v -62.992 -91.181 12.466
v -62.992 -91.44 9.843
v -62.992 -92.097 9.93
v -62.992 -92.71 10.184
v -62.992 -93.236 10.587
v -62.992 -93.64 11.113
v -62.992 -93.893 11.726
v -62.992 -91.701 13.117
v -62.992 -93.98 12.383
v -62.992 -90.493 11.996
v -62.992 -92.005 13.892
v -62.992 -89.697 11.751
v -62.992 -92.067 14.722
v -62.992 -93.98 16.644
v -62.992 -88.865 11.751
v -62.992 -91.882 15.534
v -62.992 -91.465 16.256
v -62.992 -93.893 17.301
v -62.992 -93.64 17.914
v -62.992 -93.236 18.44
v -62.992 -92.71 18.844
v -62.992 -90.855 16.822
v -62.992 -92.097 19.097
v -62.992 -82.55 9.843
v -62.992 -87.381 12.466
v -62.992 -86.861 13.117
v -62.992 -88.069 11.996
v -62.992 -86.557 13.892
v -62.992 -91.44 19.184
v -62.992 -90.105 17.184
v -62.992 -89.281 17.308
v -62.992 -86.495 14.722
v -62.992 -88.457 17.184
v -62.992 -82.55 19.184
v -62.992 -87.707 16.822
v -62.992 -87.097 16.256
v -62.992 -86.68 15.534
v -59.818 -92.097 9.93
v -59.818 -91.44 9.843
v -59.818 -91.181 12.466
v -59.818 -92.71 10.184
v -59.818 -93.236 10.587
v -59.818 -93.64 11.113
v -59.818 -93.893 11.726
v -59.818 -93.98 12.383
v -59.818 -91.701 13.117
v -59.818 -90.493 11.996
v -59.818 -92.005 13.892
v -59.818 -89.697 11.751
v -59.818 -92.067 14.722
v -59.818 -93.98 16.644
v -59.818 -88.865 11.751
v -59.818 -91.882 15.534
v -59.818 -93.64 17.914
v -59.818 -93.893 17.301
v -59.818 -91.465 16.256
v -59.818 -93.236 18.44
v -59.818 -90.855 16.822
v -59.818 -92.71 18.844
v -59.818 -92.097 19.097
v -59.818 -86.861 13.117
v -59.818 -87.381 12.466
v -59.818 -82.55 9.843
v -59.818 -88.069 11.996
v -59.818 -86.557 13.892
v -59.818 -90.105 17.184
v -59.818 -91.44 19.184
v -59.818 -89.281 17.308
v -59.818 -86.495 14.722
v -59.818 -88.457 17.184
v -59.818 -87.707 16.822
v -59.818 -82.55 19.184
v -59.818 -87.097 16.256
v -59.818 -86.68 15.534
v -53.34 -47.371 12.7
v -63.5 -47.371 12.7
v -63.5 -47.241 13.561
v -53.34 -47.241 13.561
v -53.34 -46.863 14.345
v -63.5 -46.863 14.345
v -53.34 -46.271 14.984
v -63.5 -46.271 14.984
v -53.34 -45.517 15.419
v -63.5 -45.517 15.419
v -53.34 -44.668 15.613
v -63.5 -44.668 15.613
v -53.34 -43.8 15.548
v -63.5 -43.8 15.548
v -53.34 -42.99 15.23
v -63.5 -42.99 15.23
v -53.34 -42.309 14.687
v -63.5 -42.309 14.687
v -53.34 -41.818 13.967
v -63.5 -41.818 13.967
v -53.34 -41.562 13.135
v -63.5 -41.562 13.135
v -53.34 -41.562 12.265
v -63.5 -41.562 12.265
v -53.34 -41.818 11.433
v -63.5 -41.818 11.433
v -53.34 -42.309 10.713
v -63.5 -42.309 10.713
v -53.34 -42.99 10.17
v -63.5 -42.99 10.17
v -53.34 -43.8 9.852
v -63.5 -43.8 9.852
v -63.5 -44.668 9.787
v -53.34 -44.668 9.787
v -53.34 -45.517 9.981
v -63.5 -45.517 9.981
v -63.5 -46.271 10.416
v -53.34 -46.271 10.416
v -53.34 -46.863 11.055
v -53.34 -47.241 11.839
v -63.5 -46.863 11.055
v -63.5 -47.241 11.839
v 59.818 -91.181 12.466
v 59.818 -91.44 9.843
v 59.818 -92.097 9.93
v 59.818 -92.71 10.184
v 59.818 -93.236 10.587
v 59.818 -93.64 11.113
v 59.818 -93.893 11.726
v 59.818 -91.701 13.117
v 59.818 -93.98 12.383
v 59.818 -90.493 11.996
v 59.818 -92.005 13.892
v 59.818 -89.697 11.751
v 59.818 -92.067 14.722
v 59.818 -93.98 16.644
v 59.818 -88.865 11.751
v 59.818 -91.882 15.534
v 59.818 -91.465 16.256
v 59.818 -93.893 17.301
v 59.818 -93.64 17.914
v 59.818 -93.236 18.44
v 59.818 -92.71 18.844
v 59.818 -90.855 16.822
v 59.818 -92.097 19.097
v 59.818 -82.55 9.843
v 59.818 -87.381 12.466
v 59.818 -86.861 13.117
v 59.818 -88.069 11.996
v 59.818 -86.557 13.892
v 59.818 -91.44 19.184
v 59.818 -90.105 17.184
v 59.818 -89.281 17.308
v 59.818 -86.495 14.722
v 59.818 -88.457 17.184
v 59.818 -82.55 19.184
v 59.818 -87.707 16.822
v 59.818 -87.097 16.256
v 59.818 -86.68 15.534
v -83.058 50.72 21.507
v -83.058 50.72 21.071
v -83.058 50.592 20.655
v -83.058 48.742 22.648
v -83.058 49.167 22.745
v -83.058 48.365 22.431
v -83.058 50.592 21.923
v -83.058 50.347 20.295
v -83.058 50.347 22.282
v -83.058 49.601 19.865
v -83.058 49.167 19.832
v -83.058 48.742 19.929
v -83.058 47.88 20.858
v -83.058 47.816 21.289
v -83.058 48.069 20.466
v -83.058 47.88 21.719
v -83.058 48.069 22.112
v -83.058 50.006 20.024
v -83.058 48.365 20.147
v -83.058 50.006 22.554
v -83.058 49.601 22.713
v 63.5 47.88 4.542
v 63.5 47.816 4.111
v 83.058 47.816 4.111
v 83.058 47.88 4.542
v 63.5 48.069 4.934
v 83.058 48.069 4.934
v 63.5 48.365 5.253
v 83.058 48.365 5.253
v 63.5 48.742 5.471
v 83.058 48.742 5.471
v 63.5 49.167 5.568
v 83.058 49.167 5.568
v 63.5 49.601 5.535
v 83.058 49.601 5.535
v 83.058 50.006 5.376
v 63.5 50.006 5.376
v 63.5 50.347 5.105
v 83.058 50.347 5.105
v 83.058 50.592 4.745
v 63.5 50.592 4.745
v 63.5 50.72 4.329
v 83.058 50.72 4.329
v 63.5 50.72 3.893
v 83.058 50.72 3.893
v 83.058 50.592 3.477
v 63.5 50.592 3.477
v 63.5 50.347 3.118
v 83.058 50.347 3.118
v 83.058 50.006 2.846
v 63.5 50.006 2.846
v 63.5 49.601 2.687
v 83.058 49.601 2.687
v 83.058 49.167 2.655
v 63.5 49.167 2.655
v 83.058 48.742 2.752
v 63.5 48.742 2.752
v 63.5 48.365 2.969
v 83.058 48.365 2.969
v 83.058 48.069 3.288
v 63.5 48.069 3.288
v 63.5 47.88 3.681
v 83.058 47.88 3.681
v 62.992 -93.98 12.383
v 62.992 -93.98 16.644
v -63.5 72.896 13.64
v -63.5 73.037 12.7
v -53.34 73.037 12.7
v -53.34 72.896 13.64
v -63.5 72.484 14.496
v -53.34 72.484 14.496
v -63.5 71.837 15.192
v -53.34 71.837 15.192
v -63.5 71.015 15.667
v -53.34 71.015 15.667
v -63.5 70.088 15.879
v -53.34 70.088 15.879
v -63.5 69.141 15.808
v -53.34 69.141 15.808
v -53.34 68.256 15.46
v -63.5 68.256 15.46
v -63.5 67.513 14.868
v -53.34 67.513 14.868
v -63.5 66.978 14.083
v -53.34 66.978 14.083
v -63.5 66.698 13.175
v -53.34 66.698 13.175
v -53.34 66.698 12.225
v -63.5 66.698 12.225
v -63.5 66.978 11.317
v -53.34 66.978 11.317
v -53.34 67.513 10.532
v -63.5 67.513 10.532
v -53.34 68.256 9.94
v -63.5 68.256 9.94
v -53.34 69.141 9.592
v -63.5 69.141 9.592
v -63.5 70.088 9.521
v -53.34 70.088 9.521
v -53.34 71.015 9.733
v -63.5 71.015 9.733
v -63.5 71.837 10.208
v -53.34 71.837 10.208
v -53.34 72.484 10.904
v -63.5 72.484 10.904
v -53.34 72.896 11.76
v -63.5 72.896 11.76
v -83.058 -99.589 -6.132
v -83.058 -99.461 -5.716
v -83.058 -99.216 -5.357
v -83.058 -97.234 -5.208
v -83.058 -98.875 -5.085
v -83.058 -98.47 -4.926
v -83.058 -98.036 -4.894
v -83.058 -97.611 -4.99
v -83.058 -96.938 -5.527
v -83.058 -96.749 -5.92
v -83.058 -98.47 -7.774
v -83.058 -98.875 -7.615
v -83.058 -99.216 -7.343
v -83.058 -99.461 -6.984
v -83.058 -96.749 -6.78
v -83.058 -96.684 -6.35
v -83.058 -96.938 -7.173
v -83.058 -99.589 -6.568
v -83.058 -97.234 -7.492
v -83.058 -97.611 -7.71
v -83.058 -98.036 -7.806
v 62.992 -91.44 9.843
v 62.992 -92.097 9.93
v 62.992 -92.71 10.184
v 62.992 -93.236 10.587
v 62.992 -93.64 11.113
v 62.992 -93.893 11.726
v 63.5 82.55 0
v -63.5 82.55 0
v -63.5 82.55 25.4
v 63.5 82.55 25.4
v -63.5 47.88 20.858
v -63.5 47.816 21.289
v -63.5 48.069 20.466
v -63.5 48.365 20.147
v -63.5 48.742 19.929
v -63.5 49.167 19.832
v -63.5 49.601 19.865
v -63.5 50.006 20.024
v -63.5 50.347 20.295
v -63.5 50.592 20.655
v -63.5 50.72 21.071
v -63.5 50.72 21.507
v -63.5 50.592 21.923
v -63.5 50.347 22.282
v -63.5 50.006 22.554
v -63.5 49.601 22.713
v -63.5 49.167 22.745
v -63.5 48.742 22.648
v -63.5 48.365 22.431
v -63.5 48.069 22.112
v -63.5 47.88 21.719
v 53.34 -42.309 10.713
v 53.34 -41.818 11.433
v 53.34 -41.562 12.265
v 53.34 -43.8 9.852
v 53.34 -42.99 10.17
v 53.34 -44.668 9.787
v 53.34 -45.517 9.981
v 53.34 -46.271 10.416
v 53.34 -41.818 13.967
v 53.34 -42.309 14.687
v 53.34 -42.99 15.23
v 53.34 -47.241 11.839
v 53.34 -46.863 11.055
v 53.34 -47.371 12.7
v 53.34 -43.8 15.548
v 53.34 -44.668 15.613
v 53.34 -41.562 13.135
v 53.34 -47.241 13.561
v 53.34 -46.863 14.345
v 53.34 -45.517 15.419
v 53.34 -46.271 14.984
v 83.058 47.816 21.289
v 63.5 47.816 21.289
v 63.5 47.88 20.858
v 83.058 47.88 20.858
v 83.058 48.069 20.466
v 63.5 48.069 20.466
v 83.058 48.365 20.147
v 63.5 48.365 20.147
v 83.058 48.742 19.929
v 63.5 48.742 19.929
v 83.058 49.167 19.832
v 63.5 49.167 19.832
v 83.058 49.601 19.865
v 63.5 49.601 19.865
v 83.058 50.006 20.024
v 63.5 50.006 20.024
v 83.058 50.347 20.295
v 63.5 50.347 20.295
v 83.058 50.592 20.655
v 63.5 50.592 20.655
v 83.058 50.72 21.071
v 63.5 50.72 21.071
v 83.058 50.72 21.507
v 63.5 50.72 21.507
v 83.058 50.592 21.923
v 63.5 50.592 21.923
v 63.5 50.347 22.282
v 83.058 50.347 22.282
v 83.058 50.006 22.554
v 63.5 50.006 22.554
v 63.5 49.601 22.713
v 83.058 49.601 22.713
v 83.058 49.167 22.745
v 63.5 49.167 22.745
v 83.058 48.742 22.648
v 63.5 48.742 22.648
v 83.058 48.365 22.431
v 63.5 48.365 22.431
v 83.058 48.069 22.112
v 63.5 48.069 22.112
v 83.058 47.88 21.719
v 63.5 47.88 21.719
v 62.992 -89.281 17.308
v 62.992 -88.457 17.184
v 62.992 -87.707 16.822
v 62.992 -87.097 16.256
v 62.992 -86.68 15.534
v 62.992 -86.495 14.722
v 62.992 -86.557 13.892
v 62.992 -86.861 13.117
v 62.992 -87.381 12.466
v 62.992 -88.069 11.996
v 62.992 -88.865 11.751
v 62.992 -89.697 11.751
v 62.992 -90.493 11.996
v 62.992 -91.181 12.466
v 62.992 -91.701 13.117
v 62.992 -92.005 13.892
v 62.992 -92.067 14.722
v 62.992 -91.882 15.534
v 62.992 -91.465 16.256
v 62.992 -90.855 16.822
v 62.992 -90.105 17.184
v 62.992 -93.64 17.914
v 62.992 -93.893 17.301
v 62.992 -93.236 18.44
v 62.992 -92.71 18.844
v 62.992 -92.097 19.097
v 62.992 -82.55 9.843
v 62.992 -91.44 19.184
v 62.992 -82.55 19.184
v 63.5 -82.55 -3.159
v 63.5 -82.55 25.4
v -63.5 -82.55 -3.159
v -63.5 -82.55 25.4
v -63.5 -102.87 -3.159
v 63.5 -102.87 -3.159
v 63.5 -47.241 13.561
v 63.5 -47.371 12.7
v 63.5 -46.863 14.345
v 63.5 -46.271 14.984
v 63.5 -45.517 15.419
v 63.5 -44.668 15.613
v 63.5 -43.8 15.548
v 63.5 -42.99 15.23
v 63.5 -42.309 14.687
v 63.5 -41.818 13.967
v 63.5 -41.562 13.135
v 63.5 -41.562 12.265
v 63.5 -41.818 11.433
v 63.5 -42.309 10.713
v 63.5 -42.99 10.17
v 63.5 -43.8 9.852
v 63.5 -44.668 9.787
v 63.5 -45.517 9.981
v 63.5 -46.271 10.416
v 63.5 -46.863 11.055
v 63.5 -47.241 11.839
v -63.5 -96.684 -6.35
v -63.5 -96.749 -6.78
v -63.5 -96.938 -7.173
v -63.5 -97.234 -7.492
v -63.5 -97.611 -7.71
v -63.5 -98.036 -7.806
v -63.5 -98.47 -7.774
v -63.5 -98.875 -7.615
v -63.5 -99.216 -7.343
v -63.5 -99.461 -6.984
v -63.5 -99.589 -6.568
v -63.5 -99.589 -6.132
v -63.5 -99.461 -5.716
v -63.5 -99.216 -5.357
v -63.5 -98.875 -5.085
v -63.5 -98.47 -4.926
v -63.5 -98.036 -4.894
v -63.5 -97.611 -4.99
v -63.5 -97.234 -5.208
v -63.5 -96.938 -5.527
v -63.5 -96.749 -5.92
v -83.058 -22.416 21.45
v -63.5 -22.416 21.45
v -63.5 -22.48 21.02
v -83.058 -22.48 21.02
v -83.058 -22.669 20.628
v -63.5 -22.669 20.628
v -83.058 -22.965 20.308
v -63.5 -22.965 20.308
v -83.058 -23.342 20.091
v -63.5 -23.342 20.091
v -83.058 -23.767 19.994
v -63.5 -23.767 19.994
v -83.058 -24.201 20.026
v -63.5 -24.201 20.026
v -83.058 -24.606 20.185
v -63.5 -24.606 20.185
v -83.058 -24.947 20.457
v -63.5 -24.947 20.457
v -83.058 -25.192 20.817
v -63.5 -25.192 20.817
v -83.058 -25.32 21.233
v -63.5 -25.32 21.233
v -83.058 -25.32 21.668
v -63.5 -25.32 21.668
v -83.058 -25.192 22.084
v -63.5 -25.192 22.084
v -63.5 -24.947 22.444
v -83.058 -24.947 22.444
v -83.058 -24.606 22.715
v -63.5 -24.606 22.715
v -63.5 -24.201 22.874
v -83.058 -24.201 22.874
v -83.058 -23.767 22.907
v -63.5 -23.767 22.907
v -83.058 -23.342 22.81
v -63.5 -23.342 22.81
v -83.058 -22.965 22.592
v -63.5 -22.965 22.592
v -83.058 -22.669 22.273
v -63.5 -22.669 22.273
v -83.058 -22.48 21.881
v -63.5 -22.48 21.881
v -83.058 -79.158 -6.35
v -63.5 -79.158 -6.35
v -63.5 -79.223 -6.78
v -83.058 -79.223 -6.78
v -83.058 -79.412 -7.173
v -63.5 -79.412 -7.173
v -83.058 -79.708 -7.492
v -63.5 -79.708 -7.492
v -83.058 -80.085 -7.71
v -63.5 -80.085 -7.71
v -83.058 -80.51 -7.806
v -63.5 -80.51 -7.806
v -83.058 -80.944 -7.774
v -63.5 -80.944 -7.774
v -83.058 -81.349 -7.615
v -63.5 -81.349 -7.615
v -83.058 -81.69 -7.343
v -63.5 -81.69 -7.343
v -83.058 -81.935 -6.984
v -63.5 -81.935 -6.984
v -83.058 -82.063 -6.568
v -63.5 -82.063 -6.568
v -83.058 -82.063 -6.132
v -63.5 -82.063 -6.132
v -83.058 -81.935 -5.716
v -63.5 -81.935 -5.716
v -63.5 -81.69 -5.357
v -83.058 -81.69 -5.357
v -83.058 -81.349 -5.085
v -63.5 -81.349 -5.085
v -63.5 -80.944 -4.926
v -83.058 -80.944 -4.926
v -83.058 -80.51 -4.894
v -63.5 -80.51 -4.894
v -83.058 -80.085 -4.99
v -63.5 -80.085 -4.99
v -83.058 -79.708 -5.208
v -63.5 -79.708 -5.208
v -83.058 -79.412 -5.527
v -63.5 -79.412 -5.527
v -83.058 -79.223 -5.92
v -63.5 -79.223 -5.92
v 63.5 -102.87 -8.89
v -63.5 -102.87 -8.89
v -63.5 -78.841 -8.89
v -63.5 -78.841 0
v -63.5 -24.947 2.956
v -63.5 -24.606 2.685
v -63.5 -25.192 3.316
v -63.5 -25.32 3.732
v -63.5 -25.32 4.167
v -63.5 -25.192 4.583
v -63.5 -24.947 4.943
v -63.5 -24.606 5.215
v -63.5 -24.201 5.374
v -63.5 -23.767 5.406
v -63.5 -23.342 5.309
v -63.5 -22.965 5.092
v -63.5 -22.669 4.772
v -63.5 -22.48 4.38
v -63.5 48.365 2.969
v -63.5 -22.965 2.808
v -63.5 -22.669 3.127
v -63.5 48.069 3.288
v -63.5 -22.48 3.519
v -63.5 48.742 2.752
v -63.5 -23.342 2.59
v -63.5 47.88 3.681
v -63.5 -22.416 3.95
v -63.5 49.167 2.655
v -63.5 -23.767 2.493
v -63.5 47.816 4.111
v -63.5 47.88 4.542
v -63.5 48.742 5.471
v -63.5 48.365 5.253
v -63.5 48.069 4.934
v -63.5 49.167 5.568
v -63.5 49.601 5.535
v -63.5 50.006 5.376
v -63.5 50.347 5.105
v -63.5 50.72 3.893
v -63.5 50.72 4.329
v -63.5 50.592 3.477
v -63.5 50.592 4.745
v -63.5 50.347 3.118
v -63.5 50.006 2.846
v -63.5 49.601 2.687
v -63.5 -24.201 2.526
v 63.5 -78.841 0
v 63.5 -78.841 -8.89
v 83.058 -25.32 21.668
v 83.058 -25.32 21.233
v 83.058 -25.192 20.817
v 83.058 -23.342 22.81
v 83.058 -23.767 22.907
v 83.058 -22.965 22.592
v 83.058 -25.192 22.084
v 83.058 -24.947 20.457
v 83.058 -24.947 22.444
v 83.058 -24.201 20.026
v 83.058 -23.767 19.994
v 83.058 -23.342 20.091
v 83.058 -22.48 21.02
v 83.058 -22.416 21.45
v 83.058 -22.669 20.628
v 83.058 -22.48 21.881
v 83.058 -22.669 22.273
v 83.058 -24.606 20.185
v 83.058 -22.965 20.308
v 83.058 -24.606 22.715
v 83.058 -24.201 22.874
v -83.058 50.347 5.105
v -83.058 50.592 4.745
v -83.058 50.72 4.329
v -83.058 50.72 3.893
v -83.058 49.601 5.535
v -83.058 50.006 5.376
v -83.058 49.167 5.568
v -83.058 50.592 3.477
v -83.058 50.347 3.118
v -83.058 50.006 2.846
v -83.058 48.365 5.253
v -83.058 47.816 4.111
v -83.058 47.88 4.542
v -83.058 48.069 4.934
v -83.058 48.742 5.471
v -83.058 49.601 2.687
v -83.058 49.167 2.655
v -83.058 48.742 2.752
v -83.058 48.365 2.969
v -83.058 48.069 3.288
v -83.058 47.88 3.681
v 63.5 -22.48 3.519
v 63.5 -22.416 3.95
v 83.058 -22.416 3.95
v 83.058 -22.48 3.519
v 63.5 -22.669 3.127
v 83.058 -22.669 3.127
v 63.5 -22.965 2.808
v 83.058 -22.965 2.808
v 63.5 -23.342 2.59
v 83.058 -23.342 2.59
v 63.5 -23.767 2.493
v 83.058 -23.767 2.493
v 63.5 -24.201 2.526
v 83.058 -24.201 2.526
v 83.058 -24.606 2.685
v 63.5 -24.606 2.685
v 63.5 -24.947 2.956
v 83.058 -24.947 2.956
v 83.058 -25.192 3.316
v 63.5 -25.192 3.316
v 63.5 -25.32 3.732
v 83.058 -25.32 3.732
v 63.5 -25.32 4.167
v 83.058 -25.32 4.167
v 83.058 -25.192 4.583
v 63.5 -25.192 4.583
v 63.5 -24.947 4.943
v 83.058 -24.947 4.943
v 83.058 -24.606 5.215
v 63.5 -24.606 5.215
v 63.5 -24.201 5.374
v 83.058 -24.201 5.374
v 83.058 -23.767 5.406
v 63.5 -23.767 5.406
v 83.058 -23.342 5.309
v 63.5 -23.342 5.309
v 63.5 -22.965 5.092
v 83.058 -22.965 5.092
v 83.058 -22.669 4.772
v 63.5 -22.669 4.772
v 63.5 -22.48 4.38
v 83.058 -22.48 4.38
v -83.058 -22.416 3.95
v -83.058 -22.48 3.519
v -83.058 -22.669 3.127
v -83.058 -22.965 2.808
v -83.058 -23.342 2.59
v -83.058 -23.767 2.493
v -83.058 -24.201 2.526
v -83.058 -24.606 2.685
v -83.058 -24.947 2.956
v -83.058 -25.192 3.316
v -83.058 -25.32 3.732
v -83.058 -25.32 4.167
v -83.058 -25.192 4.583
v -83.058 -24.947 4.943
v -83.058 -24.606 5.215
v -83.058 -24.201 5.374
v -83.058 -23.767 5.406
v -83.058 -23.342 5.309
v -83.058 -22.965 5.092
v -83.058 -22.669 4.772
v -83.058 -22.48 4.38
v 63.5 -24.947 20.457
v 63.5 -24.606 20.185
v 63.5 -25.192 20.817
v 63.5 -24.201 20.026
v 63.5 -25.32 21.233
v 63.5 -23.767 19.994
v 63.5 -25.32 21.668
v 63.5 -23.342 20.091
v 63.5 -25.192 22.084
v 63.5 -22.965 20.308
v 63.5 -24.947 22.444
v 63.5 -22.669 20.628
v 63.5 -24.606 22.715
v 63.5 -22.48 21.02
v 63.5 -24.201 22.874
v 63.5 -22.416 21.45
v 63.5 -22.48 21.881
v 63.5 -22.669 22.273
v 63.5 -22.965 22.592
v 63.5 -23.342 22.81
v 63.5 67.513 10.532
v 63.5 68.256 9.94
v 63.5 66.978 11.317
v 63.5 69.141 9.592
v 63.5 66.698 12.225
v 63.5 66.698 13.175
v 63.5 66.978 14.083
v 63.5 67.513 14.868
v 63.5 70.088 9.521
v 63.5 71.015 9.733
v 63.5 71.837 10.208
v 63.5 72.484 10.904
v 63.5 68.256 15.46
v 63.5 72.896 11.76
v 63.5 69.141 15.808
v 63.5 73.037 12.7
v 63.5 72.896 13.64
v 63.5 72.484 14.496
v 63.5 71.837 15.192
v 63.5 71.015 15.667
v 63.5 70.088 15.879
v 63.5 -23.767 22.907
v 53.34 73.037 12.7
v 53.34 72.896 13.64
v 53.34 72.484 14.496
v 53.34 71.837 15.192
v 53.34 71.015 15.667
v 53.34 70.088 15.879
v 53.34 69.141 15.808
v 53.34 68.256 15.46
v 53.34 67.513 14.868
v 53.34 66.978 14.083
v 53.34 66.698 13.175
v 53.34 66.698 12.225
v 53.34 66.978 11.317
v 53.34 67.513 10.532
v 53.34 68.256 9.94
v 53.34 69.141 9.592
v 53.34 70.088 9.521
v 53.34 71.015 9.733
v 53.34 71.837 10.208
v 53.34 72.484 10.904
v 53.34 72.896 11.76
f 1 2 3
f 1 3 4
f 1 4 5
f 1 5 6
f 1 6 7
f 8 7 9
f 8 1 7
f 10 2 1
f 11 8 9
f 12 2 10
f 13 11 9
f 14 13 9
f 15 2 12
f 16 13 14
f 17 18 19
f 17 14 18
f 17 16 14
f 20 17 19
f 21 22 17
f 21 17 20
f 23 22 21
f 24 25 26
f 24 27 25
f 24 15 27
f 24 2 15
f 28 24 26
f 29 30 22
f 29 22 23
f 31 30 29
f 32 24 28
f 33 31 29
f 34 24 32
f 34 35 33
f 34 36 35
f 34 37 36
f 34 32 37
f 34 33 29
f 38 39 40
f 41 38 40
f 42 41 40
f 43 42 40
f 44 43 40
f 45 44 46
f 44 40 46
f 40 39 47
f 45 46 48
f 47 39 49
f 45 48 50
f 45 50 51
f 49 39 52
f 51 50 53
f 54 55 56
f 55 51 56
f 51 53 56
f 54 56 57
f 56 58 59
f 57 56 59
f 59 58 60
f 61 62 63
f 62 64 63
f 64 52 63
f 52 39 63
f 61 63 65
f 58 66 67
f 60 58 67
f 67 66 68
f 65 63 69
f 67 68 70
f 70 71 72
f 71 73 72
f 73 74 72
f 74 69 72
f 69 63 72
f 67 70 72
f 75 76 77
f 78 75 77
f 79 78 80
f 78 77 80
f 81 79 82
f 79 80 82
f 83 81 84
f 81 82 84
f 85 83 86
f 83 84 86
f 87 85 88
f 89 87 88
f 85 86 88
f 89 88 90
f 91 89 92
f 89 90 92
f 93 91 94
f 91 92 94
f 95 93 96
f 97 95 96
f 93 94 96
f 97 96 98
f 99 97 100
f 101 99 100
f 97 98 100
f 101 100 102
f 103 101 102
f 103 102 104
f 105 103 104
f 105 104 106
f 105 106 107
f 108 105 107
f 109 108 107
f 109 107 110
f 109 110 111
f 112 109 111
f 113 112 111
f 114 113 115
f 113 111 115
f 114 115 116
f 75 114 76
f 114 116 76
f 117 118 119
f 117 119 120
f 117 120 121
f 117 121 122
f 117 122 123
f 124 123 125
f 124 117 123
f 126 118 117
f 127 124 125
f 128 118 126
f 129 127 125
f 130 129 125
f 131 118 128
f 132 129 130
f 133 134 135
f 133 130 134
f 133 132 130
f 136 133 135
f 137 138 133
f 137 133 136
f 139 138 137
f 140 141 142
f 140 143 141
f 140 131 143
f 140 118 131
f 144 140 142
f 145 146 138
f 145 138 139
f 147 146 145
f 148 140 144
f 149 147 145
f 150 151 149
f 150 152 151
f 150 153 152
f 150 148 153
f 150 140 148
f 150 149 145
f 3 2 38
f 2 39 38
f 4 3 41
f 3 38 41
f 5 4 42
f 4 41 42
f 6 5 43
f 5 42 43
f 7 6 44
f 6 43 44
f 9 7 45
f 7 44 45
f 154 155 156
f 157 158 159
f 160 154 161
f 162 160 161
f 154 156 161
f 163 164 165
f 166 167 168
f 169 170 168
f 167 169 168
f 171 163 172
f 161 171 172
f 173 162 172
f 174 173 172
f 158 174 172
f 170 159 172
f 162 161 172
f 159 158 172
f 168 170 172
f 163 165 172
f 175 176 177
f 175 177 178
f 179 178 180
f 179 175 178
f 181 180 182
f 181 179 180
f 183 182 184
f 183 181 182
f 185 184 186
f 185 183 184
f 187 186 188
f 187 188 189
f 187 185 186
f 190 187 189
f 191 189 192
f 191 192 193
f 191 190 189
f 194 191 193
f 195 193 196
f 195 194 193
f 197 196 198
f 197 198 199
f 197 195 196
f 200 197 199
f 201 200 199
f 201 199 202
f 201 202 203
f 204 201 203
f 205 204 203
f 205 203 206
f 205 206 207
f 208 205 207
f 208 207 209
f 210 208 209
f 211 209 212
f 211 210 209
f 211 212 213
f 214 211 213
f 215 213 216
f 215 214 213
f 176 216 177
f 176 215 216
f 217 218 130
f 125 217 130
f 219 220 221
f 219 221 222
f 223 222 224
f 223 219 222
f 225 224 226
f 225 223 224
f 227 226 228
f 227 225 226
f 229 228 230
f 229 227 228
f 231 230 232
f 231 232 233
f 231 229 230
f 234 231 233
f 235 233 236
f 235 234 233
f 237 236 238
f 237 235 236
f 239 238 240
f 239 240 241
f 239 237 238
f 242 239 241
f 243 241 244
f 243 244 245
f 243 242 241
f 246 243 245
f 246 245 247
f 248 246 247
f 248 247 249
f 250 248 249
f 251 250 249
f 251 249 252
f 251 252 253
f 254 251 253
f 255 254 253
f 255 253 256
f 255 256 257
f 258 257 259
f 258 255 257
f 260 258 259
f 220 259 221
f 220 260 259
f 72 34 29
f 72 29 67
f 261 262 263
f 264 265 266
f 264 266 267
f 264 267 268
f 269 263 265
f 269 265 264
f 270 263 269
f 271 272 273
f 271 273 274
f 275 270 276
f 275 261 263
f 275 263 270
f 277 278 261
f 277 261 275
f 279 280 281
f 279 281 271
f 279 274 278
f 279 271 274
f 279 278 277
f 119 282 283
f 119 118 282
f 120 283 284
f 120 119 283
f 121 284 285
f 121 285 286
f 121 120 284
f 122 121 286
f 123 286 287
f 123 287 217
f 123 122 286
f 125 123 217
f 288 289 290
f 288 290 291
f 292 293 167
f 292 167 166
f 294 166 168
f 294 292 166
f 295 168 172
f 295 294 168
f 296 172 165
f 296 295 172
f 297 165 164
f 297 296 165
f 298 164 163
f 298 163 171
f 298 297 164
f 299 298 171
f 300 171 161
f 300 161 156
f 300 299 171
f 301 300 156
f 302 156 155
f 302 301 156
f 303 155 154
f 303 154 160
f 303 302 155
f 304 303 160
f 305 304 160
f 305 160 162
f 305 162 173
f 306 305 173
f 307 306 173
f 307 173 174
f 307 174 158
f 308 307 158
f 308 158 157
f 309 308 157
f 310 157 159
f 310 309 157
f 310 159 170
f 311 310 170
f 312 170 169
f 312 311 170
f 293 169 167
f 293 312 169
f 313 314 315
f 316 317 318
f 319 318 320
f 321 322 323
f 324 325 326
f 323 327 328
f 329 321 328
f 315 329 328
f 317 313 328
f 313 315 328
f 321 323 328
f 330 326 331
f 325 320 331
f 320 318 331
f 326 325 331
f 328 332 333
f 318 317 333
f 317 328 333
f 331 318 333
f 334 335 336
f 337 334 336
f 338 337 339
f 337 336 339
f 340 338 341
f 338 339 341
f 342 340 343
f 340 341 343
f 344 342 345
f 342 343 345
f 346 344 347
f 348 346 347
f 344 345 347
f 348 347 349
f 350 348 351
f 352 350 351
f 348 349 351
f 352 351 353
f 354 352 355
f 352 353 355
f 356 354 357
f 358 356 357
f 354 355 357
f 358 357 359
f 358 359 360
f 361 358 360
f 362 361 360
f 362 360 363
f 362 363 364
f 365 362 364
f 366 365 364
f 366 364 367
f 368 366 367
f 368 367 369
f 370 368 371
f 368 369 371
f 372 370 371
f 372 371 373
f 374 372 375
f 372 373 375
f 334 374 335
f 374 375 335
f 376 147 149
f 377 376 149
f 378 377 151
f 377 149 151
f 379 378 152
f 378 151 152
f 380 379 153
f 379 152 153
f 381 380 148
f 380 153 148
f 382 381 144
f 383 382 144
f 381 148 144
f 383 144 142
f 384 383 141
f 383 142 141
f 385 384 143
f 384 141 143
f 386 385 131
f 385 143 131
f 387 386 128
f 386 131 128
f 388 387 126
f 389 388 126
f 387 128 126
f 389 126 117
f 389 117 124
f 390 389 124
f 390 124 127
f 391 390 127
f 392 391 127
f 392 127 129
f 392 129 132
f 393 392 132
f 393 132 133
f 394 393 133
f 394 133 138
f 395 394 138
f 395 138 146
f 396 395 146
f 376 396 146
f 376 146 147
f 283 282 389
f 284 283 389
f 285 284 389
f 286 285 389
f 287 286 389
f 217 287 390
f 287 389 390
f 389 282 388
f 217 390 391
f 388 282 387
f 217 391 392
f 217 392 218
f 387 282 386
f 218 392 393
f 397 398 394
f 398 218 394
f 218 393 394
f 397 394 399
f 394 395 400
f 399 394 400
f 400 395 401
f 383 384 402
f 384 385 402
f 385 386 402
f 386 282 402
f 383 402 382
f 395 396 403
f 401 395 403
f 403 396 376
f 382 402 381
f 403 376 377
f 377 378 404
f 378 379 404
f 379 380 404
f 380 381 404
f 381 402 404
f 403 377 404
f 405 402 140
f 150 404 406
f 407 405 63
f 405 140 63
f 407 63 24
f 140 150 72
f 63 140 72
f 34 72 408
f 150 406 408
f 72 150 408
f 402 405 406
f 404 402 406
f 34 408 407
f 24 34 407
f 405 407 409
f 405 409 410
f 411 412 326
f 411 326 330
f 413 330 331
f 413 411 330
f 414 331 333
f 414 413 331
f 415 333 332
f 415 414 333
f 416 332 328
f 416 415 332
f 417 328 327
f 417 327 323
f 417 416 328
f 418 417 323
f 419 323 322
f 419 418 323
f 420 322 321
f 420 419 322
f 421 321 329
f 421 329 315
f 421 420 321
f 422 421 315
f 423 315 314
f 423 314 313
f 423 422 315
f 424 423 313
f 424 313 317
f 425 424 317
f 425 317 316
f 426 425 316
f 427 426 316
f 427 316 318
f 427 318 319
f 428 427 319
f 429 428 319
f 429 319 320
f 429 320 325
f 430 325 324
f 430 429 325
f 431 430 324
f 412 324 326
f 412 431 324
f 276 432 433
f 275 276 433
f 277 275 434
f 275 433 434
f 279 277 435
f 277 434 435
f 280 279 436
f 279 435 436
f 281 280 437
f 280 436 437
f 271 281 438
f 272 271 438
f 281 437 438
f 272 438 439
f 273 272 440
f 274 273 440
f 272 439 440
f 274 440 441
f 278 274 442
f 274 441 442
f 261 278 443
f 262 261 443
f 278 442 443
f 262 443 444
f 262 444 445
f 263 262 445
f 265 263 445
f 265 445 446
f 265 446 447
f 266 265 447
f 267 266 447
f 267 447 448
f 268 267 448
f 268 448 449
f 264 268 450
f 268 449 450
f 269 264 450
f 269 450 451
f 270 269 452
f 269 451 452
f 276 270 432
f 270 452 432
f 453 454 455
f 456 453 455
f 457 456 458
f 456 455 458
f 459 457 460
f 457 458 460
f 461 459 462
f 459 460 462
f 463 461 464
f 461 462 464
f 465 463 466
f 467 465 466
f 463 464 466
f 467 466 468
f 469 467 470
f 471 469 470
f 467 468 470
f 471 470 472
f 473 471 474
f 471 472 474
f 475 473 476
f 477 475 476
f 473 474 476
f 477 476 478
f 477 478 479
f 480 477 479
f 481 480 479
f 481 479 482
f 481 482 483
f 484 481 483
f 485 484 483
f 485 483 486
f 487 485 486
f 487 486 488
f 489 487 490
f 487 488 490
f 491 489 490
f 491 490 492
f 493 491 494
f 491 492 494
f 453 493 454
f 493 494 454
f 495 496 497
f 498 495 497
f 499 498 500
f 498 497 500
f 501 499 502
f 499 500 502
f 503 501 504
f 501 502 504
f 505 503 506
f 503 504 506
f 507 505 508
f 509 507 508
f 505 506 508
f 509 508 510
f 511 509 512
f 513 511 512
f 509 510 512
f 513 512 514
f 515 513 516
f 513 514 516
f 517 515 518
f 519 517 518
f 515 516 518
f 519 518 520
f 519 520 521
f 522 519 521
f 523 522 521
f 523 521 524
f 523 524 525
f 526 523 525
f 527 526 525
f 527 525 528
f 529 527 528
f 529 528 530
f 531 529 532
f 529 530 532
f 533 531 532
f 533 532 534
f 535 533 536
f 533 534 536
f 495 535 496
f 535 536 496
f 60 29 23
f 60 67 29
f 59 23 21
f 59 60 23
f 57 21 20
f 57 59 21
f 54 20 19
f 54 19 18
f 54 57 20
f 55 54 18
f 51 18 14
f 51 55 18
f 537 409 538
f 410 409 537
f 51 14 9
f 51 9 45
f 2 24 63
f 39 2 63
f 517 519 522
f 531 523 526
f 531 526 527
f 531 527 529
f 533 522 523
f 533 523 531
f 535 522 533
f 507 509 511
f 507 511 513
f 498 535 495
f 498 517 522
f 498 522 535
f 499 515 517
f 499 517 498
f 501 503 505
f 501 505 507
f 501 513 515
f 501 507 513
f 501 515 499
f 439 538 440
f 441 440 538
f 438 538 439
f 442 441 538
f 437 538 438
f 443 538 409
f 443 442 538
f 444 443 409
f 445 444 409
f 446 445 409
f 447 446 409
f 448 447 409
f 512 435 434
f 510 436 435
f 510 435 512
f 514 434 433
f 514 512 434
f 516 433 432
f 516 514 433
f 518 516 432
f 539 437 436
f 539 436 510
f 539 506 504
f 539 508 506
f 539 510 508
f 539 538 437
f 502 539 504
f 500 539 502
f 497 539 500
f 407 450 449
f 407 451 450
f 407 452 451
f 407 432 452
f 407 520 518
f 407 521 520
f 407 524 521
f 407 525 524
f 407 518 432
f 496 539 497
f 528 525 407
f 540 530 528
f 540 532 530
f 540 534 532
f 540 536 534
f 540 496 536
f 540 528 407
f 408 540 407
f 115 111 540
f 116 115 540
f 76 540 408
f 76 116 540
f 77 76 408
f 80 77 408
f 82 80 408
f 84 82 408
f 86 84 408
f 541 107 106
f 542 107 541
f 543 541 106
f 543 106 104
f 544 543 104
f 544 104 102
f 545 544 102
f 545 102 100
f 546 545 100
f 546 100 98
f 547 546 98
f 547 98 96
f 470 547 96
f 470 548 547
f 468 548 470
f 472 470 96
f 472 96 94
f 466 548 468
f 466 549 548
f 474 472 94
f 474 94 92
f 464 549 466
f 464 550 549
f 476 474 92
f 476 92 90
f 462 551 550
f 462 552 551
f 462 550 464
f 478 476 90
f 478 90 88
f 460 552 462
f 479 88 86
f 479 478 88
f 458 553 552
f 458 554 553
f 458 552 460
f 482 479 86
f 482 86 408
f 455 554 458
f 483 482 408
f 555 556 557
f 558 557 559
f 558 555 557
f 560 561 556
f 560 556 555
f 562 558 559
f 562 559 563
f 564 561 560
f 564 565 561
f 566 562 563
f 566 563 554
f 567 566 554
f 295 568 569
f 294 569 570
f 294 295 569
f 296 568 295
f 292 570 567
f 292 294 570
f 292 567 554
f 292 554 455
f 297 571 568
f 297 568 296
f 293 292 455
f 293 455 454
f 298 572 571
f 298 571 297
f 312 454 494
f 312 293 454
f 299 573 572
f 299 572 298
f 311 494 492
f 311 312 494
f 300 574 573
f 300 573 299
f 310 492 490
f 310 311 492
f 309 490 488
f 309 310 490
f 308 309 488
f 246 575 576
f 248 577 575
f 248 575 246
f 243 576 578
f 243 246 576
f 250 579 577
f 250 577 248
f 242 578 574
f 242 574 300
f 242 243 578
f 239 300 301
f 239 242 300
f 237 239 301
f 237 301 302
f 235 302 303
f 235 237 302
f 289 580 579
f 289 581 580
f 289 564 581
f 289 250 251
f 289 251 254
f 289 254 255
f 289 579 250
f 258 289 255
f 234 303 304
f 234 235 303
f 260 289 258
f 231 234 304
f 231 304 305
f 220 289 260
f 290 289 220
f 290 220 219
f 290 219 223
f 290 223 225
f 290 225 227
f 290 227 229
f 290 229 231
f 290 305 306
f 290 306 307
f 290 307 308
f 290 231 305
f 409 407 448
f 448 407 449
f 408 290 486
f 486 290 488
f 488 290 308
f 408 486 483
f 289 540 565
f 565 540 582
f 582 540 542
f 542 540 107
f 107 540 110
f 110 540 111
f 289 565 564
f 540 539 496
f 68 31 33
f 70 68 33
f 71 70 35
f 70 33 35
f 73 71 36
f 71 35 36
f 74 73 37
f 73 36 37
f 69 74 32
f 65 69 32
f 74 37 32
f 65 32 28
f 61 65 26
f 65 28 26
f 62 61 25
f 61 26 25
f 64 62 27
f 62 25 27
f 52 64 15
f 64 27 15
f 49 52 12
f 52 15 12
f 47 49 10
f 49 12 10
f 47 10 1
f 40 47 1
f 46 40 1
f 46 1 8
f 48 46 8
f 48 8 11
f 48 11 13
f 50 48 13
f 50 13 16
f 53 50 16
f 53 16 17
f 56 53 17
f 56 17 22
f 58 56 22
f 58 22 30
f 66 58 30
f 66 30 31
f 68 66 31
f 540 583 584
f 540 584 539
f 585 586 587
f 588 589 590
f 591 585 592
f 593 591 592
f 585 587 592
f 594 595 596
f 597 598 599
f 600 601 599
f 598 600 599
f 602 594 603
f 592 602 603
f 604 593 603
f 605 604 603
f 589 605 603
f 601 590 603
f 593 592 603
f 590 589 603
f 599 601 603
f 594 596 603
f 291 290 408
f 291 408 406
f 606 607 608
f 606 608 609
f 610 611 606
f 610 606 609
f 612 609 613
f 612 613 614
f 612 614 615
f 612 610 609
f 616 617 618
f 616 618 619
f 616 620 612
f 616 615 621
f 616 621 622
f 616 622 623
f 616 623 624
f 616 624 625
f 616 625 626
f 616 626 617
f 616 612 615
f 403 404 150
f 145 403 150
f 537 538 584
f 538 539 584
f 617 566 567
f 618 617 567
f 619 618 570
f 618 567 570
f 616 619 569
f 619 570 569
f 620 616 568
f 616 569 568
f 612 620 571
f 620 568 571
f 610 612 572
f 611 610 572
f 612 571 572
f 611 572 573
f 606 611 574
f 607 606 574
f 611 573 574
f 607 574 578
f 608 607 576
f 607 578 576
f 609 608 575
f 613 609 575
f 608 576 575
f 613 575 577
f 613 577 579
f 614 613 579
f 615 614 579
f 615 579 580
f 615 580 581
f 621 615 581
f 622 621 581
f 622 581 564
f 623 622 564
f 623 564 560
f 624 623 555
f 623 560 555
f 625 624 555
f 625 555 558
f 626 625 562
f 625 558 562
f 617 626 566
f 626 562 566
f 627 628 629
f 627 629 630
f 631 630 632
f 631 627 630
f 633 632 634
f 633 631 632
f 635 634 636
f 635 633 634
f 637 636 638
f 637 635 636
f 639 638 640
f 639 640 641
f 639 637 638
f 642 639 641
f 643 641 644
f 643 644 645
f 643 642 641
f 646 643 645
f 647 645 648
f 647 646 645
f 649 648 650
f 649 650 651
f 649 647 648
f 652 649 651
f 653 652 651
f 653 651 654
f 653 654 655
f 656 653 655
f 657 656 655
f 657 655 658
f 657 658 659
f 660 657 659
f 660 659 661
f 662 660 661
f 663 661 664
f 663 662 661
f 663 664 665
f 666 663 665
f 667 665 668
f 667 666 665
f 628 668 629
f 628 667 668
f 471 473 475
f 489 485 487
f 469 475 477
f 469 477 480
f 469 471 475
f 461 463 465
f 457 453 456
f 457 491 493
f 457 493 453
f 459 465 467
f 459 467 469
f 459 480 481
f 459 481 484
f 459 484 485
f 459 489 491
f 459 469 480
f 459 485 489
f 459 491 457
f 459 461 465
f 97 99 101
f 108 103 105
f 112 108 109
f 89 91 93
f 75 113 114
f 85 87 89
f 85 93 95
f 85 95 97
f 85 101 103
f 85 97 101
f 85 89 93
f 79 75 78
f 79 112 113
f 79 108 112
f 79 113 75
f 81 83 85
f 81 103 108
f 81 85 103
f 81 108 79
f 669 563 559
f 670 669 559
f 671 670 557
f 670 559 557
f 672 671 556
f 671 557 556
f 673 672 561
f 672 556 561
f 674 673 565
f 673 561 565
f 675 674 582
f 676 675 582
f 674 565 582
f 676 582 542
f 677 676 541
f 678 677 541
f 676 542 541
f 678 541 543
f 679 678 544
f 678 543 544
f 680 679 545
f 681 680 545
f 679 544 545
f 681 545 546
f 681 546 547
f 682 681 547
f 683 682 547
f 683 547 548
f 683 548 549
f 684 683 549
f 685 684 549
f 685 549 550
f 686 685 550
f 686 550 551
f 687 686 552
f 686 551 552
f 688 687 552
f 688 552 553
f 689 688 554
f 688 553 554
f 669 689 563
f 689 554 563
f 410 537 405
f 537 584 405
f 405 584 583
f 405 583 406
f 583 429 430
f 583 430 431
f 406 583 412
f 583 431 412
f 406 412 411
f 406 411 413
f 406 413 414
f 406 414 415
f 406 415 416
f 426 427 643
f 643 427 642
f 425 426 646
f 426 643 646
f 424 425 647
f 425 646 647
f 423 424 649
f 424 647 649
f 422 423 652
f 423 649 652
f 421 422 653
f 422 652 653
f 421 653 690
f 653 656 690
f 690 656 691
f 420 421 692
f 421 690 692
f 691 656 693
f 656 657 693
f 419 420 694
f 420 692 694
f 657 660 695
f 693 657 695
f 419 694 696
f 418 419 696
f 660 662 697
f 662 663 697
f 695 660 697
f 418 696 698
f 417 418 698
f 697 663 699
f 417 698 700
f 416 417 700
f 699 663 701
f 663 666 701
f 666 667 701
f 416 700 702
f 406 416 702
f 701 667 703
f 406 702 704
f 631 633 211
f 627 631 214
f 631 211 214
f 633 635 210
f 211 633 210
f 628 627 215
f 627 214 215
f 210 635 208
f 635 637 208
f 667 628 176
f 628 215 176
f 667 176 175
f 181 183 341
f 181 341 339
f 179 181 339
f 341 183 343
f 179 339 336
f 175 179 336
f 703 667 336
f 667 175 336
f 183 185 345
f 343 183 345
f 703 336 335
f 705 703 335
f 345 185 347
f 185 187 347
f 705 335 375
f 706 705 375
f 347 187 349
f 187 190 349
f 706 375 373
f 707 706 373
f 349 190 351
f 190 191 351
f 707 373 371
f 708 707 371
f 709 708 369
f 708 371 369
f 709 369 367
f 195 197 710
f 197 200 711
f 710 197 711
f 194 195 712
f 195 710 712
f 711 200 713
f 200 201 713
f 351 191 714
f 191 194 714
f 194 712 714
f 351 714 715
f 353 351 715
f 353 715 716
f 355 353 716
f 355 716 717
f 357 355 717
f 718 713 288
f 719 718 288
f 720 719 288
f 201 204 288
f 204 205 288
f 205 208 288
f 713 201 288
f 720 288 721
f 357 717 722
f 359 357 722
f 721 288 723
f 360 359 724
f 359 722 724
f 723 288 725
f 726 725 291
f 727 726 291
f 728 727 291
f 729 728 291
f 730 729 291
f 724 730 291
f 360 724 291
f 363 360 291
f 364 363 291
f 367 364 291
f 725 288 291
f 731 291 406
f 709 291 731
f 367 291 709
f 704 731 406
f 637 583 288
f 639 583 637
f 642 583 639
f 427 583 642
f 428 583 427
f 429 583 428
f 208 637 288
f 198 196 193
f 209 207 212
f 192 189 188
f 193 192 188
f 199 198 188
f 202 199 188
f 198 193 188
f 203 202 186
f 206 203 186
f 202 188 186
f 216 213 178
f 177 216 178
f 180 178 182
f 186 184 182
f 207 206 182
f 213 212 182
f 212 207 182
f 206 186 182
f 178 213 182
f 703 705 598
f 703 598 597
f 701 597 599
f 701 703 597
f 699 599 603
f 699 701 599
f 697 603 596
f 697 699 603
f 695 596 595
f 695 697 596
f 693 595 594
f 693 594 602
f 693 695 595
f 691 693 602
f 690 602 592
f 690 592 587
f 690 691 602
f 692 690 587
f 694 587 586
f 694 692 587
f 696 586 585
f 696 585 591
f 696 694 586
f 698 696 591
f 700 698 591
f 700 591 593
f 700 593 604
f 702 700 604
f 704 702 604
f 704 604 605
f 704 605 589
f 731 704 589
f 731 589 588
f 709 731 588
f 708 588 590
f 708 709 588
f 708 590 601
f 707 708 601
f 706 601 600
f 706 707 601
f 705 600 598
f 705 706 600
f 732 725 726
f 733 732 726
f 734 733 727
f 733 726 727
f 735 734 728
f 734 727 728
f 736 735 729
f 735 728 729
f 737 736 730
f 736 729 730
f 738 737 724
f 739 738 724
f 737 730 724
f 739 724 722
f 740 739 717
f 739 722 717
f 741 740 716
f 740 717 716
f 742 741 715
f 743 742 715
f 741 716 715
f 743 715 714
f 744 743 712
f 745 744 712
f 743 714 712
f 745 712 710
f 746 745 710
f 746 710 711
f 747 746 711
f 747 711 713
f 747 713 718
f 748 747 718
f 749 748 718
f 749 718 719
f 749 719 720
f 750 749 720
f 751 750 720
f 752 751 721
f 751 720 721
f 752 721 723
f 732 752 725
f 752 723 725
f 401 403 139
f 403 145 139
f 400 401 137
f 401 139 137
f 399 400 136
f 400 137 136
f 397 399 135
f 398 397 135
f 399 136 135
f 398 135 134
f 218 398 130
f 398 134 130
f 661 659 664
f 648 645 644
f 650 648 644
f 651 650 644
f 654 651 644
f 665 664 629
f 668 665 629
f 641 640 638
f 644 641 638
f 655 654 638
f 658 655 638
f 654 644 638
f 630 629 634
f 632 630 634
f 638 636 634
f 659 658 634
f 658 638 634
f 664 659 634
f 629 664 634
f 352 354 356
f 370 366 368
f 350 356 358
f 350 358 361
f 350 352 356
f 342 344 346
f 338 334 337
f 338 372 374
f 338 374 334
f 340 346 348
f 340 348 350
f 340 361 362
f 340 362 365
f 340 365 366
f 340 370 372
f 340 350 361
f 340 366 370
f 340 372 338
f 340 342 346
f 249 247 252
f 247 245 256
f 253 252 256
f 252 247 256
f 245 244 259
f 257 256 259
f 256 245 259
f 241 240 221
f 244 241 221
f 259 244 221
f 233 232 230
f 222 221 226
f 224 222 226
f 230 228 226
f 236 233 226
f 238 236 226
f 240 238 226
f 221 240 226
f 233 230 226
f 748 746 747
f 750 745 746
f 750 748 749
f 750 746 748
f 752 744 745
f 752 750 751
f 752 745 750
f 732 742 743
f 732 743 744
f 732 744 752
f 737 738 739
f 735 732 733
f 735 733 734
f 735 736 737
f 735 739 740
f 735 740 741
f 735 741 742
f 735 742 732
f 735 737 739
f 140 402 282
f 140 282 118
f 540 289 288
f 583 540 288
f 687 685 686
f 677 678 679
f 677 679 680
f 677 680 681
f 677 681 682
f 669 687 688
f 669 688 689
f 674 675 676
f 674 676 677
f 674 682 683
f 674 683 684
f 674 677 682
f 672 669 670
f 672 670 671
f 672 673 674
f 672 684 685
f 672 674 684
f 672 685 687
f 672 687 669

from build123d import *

# Parameters (mm, degrees)
SKETCH1_W               = 127
SKETCH1_H               = 165.1
BOSS_EXTRUDE1_DEPTH     = 25.4
SKETCH3_R               = 2.921
CUT_EXTRUDE1_DEPTH      = 10.16
SKETCH4_R               = 1.4605
BOSS_EXTRUDE2_DEPTH     = 19.558
SKETCH5_R               = 1.4605
BOSS_EXTRUDE3_DEPTH     = 19.558
SKETCH6_W               = 3.173966583
SKETCH6_H               = 9.34053023
BOSS_EXTRUDE4_DEPTH     = 11.43
SKETCH7_R               = 2.794
CUT_EXTRUDE2_DEPTH      = 176.522086644
SKETCH8_R               = 3.187487877
CUT_EXTRUDE4_DEPTH      = 10.16
SKETCH11_R              = 1.4605
BOSS_EXTRUDE5_DEPTH     = 19.558
MIRROR6_COPY_1_SKETCH_R = 1.4605
MIRROR6_COPY_1_DEPTH    = 19.558
FILLET1_R               = 2.54
SKETCH15_W              = 127
SKETCH15_H              = 3.709069246
BOSS_EXTRUDE6_DEPTH     = 8.89
SKETCH16_W              = 127
SKETCH16_H              = 5.731432552
BOSS_EXTRUDE7_DEPTH     = 20.32
SKETCH17_R              = 1.4605
BOSS_EXTRUDE8_DEPTH     = 19.558
SKETCH18_R              = 1.4605
BOSS_EXTRUDE9_DEPTH     = 19.558


with BuildPart() as part:
    # Sketch1 → Boss-Extrude1 (new body)
    with BuildSketch(Plane.XY):
        Rectangle(SKETCH1_W, SKETCH1_H)
    extrude(amount=BOSS_EXTRUDE1_DEPTH)

    # Sketch3 → Cut-Extrude1 (cut)
    with BuildSketch(Plane.ZY.offset(63.5)):
        with Locations(Location((12.7, -44.45, 0), (0, 0, 270))):
            Circle(SKETCH3_R)
    cut_extrude1 = extrude(amount=-CUT_EXTRUDE1_DEPTH, mode=Mode.SUBTRACT)

    # Mirror1: Cut-Extrude1 across plane
    add(cut_extrude1.mirror(Plane(origin=(0, 0, 0), x_dir=(0, 0, 1), z_dir=(1, 0, 0))), mode=Mode.SUBTRACT)

    # Sketch4 → Boss-Extrude2 (add)
    with BuildSketch(Plane.ZY.offset(63.5)):
        with Locations(Location((3.9497, -23.876, 0), (0, 0, 90))):
            Circle(SKETCH4_R)
    boss_extrude2 = extrude(amount=BOSS_EXTRUDE2_DEPTH)

    # Sketch5 → Boss-Extrude3 (add)
    with BuildSketch(Plane.ZY.offset(63.5)):
        with Locations(Location((21.4503, -23.876, 0), (0, 0, 90))):
            Circle(SKETCH5_R)
    boss_extrude3 = extrude(amount=BOSS_EXTRUDE3_DEPTH)

    # Mirror2: Boss-Extrude2, Boss-Extrude3 across plane
    add(boss_extrude2.mirror(Plane(origin=(0, 0, 0), x_dir=(0, 0, 1), z_dir=(1, 0, 0))))
    add(boss_extrude3.mirror(Plane(origin=(0, 0, 0), x_dir=(0, 0, 1), z_dir=(1, 0, 0))))

    # Sketch6 → Boss-Extrude4 (add)
    with BuildSketch(Plane.XZ.offset(82.55)):
        with Locations((-61.405016708, 14.51369519)):
            Rectangle(SKETCH6_W, SKETCH6_H)
    boss_extrude4 = extrude(amount=BOSS_EXTRUDE4_DEPTH)

    # Mirror3: Boss-Extrude4 across plane
    add(boss_extrude4.mirror(Plane(origin=(0, 0, 0), x_dir=(0, 0, 1), z_dir=(1, 0, 0))))

    # Sketch7 → Cut-Extrude2 (cut, through all)
    with BuildSketch(Plane.ZY.offset(62.992)):
        with Locations((14.51369519, -89.281)):
            Circle(SKETCH7_R)
    extrude(amount=-CUT_EXTRUDE2_DEPTH, mode=Mode.SUBTRACT)

    # Sketch8 → Cut-Extrude4 (cut)
    with BuildSketch(Plane(origin=(63.5, 0, 0), x_dir=(0, 0, -1), z_dir=(1, 0, 0))):
        with Locations(Location((-12.7, 69.85, 0), (0, 0, 90))):
            Circle(SKETCH8_R)
    cut_extrude4 = extrude(amount=-CUT_EXTRUDE4_DEPTH, mode=Mode.SUBTRACT)

    # Sketch11 → Boss-Extrude5 (add)
    with BuildSketch(Plane(origin=(63.5, 0, 0), x_dir=(0, 0, -1), z_dir=(1, 0, 0))):
        with Locations(Location((-21.288830822, 49.276, 0), (0, 0, 270))):
            Circle(SKETCH11_R)
    boss_extrude5 = extrude(amount=BOSS_EXTRUDE5_DEPTH)

    # Mirror4: Boss-Extrude5 across plane
    add(boss_extrude5.mirror(Plane.XY.offset(12.7)))

    # Mirror6: Cut-Extrude4, Boss-Extrude5 across plane
    add(cut_extrude4.mirror(Plane(origin=(0, 0, 0), x_dir=(0, 0, 1), z_dir=(1, 0, 0))), mode=Mode.SUBTRACT)
    add(boss_extrude5.mirror(Plane(origin=(0, 0, 0), x_dir=(0, 0, 1), z_dir=(1, 0, 0))))

    # Mirror6 copy 1 sketch → Mirror6 copy 1 (add)
    with BuildSketch(Plane(origin=(-63.5, 0, 25.4), x_dir=(0, 0, 1), z_dir=(-1, 0, 0))):
        with Locations(Location((-21.288830822, 49.276, 0), (0, 0, 270))):
            Circle(MIRROR6_COPY_1_SKETCH_R)
    extrude(amount=MIRROR6_COPY_1_DEPTH)

    # Fillet1
    fillet1_edges = [part.edges().sort_by_distance(p)[0] for p in [
        (-61.405016709, -93.98, 9.843430075),
        (-61.405016709, -93.98, 19.183960305),
        (61.405016709, -93.98, 19.183960305),
        (61.405016709, -93.98, 9.843430075),
    ]]
    fillet(fillet1_edges, radius=FILLET1_R)

    # Sketch15 → Boss-Extrude6 (add)
    with BuildSketch(Plane(origin=(0, 0, 0), x_dir=(-1, 0, 0), z_dir=(0, 0, -1))):
        with Locations((0, -80.695465377)):
            Rectangle(SKETCH15_W, SKETCH15_H)
    extrude(amount=BOSS_EXTRUDE6_DEPTH)

    # Sketch16 → Boss-Extrude7 (add)
    with BuildSketch(Plane.XZ.offset(82.55)):
        with Locations((0, -6.024283724)):
            Rectangle(SKETCH16_W, SKETCH16_H)
    extrude(amount=BOSS_EXTRUDE7_DEPTH)

    # Sketch17 → Boss-Extrude8 (add)
    with BuildSketch(Plane.ZY.offset(63.5)):
        with Locations(Location((-6.35, -80.618930754, 0), (0, 0, 90))):
            Circle(SKETCH17_R)
    extrude(amount=BOSS_EXTRUDE8_DEPTH)

    # Sketch18 → Boss-Extrude9 (add)
    with BuildSketch(Plane.ZY.offset(63.5)):
        with Locations(Location((-6.35, -98.144930754, 0), (0, 0, 90))):
            Circle(SKETCH18_R)
    extrude(amount=BOSS_EXTRUDE9_DEPTH)


solid = part.part
